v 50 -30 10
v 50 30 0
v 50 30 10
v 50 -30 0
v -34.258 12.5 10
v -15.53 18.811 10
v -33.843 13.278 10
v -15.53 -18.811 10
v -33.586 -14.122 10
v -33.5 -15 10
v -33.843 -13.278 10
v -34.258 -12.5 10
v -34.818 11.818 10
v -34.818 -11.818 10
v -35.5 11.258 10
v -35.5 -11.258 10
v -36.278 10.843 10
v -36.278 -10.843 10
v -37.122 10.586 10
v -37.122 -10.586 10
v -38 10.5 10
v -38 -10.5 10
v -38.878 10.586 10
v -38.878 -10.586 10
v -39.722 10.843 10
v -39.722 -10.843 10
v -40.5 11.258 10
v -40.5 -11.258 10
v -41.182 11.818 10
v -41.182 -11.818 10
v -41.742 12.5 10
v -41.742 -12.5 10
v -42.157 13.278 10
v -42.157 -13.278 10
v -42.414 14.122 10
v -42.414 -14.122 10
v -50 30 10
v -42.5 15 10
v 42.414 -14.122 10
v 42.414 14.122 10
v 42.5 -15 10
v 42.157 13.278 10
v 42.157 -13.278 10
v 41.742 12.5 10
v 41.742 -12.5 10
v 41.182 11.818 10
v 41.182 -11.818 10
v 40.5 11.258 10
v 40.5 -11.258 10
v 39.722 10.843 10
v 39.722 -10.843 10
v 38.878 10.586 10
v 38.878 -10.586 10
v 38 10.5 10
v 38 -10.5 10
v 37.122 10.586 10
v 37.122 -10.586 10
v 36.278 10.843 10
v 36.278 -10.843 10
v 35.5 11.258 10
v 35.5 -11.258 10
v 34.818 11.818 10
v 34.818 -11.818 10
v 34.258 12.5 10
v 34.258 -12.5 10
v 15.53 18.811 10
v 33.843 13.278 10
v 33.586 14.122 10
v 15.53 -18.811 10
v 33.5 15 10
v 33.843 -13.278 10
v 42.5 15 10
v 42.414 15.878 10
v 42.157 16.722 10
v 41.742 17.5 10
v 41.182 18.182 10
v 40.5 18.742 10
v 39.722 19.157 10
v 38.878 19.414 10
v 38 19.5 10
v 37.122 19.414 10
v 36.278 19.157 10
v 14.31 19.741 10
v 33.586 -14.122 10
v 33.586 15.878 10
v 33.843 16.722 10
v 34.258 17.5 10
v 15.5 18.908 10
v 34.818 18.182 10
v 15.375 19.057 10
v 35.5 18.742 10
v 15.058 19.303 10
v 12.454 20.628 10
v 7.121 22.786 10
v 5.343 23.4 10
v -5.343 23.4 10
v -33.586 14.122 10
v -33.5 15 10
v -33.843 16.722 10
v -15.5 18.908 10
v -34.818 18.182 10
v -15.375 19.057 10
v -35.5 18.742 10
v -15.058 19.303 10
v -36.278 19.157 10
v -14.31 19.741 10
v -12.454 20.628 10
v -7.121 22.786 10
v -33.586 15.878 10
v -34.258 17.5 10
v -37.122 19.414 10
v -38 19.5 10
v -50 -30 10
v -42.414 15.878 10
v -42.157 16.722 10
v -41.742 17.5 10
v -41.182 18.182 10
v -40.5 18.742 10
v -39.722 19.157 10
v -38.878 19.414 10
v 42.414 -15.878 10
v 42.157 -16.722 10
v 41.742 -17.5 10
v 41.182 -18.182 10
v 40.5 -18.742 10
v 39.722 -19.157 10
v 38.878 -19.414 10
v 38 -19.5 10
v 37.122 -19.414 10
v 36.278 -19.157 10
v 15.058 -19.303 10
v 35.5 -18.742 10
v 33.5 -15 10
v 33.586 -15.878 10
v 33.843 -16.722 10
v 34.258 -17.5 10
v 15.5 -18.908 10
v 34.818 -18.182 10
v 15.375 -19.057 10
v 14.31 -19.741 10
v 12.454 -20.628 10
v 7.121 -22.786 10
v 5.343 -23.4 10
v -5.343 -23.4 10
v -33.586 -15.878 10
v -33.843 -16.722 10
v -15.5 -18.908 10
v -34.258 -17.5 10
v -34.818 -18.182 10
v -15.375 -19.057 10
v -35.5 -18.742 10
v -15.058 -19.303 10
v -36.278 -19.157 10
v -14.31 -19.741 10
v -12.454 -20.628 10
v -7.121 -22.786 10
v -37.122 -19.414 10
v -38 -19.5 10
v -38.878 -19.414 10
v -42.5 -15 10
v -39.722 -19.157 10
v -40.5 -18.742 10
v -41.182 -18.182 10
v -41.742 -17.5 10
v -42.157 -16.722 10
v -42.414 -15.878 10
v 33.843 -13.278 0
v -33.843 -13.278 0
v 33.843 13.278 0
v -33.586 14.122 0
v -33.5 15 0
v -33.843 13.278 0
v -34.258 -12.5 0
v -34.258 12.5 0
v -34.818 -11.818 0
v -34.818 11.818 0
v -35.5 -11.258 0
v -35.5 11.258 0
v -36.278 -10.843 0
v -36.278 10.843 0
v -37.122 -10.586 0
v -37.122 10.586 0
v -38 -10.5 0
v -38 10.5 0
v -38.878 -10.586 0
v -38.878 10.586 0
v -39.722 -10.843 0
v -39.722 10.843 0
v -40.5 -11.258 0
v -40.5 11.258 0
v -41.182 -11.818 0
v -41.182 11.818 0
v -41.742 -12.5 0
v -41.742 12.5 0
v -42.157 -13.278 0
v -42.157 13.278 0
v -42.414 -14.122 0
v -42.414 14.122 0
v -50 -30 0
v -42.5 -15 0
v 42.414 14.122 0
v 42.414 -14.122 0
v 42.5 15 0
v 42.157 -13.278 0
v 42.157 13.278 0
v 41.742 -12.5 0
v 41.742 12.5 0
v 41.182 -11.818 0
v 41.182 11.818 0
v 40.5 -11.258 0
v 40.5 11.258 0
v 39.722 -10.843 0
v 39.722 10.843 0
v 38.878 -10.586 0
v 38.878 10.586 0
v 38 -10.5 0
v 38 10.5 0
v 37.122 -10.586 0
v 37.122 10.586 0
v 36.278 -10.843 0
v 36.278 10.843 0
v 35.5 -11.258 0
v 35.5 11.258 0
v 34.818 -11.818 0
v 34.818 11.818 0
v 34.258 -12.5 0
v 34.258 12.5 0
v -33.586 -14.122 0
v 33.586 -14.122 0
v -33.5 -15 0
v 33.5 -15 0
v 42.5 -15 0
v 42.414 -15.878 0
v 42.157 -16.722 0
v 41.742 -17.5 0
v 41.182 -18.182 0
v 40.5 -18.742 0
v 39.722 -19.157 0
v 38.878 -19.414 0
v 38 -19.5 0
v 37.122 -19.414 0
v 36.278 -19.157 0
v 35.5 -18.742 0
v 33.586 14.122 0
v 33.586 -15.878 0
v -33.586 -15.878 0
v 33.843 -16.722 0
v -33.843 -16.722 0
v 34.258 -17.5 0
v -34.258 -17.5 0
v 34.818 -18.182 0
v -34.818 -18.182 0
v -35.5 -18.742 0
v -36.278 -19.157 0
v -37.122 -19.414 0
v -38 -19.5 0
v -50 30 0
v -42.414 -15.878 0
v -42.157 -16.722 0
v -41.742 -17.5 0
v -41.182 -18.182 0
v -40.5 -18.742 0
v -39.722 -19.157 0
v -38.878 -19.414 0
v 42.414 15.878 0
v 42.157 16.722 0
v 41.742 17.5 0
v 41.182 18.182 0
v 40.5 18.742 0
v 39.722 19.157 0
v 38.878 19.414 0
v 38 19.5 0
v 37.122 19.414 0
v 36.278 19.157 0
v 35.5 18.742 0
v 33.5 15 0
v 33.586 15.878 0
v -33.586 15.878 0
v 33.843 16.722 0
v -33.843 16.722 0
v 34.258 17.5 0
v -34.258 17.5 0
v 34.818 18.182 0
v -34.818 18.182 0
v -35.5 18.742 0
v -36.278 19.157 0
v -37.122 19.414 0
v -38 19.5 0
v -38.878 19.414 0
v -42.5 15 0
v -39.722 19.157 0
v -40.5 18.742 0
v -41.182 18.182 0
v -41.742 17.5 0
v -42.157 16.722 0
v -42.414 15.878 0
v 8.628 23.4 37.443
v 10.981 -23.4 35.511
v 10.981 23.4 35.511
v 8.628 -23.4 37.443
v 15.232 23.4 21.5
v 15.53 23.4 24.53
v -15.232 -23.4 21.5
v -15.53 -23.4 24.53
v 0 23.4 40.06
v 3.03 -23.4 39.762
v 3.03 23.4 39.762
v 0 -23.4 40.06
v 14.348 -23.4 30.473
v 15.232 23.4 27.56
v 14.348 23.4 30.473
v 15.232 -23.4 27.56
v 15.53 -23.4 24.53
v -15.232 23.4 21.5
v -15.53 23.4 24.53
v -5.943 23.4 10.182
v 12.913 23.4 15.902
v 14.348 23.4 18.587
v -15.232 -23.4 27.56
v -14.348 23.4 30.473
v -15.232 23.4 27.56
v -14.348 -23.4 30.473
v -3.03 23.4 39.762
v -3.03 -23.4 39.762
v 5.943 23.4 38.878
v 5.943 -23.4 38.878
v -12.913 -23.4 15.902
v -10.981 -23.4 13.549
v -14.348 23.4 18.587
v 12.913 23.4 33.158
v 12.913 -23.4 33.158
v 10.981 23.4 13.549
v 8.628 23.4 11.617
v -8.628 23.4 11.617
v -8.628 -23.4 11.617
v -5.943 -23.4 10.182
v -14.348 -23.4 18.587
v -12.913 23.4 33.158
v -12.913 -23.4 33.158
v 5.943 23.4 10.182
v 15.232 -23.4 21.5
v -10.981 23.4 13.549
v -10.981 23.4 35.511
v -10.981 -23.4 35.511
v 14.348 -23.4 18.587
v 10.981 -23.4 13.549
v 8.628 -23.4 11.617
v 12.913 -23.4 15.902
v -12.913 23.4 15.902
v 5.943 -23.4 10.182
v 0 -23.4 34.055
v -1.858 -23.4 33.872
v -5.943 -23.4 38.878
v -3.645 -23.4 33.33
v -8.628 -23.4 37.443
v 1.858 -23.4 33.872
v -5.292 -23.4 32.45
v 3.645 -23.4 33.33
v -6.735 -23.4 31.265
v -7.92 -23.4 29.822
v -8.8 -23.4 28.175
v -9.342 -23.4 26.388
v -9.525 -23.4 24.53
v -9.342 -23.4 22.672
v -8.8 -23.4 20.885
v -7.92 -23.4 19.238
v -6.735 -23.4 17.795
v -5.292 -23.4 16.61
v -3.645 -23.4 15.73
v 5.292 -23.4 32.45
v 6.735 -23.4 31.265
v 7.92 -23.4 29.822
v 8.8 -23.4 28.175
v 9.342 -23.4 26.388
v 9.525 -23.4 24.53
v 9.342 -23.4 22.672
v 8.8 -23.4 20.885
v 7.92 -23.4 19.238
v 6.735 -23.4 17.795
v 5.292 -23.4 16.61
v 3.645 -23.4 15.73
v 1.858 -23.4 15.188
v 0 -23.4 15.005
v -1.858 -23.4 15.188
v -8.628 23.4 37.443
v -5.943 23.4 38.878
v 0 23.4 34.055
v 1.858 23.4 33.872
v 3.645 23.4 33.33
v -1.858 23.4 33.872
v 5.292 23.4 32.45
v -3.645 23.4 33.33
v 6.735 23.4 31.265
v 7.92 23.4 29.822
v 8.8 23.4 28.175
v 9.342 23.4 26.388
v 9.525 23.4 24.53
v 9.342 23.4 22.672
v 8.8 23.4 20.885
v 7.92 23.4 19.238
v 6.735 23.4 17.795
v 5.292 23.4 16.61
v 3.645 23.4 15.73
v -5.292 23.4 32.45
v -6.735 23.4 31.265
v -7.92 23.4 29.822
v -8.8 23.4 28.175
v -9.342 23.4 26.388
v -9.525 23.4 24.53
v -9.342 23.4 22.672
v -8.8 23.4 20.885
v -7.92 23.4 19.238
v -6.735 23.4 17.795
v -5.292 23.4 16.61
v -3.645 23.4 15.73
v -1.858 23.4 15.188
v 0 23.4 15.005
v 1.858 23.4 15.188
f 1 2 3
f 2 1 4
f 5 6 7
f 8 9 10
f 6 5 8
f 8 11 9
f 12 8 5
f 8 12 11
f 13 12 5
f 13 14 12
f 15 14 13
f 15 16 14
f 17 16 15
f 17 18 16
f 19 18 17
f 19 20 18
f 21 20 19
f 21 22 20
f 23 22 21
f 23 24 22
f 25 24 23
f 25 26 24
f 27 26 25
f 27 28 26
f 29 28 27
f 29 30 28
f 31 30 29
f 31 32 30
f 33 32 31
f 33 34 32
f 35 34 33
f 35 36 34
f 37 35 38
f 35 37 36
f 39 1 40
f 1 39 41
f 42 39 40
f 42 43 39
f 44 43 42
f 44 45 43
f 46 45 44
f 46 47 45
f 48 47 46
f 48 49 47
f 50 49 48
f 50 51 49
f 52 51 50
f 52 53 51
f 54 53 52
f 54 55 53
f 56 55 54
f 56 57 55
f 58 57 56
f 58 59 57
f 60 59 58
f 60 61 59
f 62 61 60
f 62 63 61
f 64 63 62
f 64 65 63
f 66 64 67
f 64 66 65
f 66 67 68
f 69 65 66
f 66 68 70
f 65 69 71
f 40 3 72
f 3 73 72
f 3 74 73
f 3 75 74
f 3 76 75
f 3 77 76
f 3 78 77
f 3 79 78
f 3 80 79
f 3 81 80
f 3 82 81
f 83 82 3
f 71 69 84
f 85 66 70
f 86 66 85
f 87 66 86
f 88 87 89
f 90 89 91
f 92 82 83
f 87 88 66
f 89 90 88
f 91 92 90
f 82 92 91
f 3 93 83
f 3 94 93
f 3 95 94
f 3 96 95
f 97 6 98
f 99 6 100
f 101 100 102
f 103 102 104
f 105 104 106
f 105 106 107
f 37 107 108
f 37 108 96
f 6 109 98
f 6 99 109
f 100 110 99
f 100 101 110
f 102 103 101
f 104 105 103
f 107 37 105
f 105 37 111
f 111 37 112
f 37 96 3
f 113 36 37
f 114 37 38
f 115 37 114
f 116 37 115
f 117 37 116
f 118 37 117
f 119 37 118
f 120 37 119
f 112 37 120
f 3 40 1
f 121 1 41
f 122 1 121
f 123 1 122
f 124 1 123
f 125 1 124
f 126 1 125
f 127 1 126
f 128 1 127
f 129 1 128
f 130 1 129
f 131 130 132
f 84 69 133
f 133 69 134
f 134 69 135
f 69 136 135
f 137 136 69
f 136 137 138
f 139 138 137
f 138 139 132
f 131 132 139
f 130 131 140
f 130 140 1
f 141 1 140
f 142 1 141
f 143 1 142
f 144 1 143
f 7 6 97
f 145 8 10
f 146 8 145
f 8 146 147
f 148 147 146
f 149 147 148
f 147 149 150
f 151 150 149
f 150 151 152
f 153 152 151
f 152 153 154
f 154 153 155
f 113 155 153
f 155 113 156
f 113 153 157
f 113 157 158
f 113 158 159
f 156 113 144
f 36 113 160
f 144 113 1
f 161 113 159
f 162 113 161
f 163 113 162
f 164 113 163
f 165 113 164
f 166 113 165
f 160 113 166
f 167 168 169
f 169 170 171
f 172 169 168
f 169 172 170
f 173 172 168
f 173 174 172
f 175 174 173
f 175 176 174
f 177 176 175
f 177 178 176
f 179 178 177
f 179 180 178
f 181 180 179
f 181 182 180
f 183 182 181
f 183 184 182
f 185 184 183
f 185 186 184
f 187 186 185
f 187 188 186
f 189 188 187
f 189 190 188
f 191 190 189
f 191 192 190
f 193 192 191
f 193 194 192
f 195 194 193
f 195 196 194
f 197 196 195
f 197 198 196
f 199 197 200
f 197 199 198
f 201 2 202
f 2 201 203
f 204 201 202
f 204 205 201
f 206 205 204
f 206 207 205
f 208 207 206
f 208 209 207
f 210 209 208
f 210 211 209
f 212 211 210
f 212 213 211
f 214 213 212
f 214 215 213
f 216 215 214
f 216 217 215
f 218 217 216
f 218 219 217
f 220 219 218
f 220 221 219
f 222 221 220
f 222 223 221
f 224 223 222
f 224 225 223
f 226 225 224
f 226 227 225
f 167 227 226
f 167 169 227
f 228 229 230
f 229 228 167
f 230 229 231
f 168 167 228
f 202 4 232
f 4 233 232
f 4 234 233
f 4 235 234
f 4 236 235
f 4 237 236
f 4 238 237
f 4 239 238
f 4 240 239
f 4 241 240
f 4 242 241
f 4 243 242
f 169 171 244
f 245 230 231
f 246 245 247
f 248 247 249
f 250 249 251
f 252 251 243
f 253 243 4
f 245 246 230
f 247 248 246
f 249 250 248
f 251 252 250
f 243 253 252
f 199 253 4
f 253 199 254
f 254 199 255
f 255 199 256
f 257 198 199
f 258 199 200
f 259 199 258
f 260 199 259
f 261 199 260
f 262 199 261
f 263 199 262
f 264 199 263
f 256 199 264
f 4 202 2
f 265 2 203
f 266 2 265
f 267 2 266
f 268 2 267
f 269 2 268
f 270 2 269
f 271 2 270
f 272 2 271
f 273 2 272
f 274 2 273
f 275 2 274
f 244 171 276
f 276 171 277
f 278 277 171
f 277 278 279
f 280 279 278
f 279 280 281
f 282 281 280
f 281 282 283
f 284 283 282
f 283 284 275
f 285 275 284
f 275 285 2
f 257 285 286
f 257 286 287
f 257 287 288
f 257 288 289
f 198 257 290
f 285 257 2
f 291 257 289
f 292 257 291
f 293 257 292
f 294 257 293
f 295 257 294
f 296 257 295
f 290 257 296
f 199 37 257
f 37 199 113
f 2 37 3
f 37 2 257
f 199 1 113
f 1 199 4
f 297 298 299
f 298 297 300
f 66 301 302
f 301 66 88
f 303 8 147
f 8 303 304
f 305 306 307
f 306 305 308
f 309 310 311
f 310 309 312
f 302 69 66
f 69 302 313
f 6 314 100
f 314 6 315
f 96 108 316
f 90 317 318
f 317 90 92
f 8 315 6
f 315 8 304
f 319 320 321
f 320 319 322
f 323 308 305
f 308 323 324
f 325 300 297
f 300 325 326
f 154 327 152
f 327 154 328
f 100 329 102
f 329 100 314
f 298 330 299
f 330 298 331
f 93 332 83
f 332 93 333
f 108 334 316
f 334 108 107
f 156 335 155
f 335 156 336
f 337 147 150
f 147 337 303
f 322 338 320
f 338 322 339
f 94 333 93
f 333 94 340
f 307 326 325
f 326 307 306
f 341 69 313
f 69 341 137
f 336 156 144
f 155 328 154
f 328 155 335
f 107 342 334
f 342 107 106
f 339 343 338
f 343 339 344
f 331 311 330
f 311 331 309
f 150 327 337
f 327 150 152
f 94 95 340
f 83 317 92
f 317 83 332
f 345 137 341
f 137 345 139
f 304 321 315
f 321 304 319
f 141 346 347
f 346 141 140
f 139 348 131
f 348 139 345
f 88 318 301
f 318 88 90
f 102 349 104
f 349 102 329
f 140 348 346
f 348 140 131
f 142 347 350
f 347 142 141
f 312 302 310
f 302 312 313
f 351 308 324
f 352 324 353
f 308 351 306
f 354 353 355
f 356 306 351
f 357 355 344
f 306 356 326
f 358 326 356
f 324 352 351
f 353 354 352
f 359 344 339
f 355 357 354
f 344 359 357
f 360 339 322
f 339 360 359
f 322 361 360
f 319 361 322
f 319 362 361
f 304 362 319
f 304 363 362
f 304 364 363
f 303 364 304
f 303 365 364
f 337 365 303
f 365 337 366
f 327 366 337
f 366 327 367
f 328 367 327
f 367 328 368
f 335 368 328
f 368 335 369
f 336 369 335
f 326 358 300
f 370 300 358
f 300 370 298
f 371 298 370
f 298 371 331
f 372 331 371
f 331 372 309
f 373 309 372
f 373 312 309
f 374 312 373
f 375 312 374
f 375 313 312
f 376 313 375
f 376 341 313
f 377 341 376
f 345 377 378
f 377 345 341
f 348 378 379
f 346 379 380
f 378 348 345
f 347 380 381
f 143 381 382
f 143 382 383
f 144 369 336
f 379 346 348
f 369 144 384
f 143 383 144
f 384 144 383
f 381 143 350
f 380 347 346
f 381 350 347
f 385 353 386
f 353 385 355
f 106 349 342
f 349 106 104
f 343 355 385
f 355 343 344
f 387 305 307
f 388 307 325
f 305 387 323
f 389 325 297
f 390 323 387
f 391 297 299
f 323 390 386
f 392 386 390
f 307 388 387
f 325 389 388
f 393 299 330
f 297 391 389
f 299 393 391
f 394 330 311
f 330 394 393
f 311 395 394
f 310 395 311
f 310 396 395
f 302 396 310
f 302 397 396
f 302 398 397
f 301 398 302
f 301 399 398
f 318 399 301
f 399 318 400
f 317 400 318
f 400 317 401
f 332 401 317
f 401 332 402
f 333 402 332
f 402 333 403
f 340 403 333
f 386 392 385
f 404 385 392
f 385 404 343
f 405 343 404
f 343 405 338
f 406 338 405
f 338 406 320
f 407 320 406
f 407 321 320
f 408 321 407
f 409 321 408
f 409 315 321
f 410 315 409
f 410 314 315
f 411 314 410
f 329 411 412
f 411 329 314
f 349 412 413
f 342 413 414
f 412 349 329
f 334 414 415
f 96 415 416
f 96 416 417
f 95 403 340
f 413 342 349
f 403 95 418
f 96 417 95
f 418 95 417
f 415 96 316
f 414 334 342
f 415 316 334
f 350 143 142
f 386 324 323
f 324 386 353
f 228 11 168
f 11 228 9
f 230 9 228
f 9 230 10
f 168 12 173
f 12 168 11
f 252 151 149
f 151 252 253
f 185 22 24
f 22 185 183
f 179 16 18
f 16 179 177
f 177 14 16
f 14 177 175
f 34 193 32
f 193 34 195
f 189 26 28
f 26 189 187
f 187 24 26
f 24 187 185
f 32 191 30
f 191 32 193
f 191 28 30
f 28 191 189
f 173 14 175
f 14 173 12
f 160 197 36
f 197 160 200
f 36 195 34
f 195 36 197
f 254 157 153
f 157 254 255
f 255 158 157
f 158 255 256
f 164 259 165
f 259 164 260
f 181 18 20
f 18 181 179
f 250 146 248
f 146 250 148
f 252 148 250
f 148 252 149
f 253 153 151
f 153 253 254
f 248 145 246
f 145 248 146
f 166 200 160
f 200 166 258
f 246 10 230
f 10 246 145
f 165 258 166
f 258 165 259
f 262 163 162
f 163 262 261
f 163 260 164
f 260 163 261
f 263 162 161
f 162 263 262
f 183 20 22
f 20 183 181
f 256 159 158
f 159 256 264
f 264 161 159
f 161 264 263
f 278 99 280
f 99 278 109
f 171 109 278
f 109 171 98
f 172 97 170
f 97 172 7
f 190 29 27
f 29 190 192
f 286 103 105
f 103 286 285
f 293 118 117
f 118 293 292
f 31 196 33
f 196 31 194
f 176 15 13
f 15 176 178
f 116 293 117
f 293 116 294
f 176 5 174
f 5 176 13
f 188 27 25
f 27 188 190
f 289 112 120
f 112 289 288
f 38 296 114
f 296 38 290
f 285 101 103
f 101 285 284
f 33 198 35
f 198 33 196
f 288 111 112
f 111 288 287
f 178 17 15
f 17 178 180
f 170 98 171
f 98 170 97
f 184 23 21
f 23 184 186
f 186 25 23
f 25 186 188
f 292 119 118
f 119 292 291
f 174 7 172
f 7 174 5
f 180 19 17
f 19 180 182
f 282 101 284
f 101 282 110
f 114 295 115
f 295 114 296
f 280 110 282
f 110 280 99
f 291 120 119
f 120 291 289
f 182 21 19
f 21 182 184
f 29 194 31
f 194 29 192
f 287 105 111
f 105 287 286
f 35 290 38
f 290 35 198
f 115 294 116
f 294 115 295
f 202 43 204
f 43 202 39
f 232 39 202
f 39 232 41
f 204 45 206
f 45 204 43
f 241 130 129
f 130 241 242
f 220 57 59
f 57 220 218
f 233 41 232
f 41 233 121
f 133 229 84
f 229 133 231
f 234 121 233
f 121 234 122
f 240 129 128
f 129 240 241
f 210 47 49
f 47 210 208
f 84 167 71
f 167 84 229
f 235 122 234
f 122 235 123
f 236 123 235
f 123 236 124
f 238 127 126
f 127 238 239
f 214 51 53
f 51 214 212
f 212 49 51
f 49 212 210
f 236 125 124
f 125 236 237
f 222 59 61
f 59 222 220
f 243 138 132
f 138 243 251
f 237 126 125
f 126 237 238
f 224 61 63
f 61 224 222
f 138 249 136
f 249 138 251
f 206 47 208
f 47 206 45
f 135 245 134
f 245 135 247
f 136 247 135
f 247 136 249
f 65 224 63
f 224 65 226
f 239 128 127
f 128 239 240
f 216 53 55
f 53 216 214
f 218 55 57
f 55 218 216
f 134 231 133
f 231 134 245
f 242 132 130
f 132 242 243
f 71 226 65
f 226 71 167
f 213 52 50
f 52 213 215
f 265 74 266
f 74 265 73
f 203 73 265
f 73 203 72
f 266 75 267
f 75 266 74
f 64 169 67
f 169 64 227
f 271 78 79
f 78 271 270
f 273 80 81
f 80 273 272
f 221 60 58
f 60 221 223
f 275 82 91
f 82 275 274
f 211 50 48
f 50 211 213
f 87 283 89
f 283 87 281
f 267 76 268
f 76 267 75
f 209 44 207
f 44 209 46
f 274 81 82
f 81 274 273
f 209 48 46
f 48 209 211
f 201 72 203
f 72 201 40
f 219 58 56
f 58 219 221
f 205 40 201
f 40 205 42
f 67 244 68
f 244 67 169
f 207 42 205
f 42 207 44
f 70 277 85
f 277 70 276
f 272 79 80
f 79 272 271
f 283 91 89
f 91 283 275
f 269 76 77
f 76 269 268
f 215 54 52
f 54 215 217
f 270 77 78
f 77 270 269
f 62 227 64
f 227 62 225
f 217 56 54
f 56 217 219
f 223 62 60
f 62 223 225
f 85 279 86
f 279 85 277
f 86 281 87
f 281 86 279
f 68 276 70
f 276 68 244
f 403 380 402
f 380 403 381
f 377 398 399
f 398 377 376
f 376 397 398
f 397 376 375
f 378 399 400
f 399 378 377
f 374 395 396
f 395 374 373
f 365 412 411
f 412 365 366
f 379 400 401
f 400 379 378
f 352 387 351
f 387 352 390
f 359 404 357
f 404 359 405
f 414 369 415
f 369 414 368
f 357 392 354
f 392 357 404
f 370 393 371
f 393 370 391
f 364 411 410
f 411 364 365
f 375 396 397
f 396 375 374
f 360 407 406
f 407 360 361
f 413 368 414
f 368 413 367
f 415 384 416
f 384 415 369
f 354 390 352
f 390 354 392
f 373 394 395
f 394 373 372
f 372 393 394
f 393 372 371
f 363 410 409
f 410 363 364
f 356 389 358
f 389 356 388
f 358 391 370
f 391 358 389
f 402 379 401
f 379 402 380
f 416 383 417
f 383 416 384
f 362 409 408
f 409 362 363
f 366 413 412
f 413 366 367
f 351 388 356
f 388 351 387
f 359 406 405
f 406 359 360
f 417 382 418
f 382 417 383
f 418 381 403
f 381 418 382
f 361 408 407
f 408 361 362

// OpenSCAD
$fn = 32;

// ----------------------------------------------------------------------
// Bearing block: 100 x 60 mm base, 19.05 mm bore at 24.53 mm
// ----------------------------------------------------------------------

// --- parameters (mm) ---
base_w = 100;             // base width
base_d = 60;              // base depth
base_t = 10;              // base thickness
bore_d = 19.05;           // shaft / bearing bore
house_r = 15.53;          // housing outer radius
house_len = 46.8;         // housing length along the shaft
foot_w = 31.06;           // foot width under the housing
foot_len = 36.8;          // foot length along the shaft
axis_z = 24.53;           // bore axis height above the base
holes_d = 9;              // mounting holes
hole_x = 38;              // mounting hole spacing

difference() {
  union() {
    /* base plate with its underside on z = 0 */
    translate([0, 0, base_t / 2]) cube([base_w, base_d, base_t], center = true);
    /* hull foot: a straight web blending into the round housing */
    hull() {
      translate([0, 0, base_t - 0.5]) cube([foot_w, foot_len, 1.6], center = true);
      translate([0, 0, axis_z]) rotate([-90, 0, 0]) cylinder(h = house_len, d = 2 * house_r, center = true);
    }
  }
  /* bore through the housing, 2.5 mm clear on both sides */
  translate([0, 0, axis_z]) rotate([-90, 0, 0]) cylinder(h = house_len + 5, d = bore_d, center = true);
  /* mounting holes through the base plate */
  for (hx = [-38, 38]) {
    for (hy = [-15, 15]) {
      translate([hx, hy, -2.5]) cylinder(h = base_t + 5, d = holes_d);
    }
  }
}
